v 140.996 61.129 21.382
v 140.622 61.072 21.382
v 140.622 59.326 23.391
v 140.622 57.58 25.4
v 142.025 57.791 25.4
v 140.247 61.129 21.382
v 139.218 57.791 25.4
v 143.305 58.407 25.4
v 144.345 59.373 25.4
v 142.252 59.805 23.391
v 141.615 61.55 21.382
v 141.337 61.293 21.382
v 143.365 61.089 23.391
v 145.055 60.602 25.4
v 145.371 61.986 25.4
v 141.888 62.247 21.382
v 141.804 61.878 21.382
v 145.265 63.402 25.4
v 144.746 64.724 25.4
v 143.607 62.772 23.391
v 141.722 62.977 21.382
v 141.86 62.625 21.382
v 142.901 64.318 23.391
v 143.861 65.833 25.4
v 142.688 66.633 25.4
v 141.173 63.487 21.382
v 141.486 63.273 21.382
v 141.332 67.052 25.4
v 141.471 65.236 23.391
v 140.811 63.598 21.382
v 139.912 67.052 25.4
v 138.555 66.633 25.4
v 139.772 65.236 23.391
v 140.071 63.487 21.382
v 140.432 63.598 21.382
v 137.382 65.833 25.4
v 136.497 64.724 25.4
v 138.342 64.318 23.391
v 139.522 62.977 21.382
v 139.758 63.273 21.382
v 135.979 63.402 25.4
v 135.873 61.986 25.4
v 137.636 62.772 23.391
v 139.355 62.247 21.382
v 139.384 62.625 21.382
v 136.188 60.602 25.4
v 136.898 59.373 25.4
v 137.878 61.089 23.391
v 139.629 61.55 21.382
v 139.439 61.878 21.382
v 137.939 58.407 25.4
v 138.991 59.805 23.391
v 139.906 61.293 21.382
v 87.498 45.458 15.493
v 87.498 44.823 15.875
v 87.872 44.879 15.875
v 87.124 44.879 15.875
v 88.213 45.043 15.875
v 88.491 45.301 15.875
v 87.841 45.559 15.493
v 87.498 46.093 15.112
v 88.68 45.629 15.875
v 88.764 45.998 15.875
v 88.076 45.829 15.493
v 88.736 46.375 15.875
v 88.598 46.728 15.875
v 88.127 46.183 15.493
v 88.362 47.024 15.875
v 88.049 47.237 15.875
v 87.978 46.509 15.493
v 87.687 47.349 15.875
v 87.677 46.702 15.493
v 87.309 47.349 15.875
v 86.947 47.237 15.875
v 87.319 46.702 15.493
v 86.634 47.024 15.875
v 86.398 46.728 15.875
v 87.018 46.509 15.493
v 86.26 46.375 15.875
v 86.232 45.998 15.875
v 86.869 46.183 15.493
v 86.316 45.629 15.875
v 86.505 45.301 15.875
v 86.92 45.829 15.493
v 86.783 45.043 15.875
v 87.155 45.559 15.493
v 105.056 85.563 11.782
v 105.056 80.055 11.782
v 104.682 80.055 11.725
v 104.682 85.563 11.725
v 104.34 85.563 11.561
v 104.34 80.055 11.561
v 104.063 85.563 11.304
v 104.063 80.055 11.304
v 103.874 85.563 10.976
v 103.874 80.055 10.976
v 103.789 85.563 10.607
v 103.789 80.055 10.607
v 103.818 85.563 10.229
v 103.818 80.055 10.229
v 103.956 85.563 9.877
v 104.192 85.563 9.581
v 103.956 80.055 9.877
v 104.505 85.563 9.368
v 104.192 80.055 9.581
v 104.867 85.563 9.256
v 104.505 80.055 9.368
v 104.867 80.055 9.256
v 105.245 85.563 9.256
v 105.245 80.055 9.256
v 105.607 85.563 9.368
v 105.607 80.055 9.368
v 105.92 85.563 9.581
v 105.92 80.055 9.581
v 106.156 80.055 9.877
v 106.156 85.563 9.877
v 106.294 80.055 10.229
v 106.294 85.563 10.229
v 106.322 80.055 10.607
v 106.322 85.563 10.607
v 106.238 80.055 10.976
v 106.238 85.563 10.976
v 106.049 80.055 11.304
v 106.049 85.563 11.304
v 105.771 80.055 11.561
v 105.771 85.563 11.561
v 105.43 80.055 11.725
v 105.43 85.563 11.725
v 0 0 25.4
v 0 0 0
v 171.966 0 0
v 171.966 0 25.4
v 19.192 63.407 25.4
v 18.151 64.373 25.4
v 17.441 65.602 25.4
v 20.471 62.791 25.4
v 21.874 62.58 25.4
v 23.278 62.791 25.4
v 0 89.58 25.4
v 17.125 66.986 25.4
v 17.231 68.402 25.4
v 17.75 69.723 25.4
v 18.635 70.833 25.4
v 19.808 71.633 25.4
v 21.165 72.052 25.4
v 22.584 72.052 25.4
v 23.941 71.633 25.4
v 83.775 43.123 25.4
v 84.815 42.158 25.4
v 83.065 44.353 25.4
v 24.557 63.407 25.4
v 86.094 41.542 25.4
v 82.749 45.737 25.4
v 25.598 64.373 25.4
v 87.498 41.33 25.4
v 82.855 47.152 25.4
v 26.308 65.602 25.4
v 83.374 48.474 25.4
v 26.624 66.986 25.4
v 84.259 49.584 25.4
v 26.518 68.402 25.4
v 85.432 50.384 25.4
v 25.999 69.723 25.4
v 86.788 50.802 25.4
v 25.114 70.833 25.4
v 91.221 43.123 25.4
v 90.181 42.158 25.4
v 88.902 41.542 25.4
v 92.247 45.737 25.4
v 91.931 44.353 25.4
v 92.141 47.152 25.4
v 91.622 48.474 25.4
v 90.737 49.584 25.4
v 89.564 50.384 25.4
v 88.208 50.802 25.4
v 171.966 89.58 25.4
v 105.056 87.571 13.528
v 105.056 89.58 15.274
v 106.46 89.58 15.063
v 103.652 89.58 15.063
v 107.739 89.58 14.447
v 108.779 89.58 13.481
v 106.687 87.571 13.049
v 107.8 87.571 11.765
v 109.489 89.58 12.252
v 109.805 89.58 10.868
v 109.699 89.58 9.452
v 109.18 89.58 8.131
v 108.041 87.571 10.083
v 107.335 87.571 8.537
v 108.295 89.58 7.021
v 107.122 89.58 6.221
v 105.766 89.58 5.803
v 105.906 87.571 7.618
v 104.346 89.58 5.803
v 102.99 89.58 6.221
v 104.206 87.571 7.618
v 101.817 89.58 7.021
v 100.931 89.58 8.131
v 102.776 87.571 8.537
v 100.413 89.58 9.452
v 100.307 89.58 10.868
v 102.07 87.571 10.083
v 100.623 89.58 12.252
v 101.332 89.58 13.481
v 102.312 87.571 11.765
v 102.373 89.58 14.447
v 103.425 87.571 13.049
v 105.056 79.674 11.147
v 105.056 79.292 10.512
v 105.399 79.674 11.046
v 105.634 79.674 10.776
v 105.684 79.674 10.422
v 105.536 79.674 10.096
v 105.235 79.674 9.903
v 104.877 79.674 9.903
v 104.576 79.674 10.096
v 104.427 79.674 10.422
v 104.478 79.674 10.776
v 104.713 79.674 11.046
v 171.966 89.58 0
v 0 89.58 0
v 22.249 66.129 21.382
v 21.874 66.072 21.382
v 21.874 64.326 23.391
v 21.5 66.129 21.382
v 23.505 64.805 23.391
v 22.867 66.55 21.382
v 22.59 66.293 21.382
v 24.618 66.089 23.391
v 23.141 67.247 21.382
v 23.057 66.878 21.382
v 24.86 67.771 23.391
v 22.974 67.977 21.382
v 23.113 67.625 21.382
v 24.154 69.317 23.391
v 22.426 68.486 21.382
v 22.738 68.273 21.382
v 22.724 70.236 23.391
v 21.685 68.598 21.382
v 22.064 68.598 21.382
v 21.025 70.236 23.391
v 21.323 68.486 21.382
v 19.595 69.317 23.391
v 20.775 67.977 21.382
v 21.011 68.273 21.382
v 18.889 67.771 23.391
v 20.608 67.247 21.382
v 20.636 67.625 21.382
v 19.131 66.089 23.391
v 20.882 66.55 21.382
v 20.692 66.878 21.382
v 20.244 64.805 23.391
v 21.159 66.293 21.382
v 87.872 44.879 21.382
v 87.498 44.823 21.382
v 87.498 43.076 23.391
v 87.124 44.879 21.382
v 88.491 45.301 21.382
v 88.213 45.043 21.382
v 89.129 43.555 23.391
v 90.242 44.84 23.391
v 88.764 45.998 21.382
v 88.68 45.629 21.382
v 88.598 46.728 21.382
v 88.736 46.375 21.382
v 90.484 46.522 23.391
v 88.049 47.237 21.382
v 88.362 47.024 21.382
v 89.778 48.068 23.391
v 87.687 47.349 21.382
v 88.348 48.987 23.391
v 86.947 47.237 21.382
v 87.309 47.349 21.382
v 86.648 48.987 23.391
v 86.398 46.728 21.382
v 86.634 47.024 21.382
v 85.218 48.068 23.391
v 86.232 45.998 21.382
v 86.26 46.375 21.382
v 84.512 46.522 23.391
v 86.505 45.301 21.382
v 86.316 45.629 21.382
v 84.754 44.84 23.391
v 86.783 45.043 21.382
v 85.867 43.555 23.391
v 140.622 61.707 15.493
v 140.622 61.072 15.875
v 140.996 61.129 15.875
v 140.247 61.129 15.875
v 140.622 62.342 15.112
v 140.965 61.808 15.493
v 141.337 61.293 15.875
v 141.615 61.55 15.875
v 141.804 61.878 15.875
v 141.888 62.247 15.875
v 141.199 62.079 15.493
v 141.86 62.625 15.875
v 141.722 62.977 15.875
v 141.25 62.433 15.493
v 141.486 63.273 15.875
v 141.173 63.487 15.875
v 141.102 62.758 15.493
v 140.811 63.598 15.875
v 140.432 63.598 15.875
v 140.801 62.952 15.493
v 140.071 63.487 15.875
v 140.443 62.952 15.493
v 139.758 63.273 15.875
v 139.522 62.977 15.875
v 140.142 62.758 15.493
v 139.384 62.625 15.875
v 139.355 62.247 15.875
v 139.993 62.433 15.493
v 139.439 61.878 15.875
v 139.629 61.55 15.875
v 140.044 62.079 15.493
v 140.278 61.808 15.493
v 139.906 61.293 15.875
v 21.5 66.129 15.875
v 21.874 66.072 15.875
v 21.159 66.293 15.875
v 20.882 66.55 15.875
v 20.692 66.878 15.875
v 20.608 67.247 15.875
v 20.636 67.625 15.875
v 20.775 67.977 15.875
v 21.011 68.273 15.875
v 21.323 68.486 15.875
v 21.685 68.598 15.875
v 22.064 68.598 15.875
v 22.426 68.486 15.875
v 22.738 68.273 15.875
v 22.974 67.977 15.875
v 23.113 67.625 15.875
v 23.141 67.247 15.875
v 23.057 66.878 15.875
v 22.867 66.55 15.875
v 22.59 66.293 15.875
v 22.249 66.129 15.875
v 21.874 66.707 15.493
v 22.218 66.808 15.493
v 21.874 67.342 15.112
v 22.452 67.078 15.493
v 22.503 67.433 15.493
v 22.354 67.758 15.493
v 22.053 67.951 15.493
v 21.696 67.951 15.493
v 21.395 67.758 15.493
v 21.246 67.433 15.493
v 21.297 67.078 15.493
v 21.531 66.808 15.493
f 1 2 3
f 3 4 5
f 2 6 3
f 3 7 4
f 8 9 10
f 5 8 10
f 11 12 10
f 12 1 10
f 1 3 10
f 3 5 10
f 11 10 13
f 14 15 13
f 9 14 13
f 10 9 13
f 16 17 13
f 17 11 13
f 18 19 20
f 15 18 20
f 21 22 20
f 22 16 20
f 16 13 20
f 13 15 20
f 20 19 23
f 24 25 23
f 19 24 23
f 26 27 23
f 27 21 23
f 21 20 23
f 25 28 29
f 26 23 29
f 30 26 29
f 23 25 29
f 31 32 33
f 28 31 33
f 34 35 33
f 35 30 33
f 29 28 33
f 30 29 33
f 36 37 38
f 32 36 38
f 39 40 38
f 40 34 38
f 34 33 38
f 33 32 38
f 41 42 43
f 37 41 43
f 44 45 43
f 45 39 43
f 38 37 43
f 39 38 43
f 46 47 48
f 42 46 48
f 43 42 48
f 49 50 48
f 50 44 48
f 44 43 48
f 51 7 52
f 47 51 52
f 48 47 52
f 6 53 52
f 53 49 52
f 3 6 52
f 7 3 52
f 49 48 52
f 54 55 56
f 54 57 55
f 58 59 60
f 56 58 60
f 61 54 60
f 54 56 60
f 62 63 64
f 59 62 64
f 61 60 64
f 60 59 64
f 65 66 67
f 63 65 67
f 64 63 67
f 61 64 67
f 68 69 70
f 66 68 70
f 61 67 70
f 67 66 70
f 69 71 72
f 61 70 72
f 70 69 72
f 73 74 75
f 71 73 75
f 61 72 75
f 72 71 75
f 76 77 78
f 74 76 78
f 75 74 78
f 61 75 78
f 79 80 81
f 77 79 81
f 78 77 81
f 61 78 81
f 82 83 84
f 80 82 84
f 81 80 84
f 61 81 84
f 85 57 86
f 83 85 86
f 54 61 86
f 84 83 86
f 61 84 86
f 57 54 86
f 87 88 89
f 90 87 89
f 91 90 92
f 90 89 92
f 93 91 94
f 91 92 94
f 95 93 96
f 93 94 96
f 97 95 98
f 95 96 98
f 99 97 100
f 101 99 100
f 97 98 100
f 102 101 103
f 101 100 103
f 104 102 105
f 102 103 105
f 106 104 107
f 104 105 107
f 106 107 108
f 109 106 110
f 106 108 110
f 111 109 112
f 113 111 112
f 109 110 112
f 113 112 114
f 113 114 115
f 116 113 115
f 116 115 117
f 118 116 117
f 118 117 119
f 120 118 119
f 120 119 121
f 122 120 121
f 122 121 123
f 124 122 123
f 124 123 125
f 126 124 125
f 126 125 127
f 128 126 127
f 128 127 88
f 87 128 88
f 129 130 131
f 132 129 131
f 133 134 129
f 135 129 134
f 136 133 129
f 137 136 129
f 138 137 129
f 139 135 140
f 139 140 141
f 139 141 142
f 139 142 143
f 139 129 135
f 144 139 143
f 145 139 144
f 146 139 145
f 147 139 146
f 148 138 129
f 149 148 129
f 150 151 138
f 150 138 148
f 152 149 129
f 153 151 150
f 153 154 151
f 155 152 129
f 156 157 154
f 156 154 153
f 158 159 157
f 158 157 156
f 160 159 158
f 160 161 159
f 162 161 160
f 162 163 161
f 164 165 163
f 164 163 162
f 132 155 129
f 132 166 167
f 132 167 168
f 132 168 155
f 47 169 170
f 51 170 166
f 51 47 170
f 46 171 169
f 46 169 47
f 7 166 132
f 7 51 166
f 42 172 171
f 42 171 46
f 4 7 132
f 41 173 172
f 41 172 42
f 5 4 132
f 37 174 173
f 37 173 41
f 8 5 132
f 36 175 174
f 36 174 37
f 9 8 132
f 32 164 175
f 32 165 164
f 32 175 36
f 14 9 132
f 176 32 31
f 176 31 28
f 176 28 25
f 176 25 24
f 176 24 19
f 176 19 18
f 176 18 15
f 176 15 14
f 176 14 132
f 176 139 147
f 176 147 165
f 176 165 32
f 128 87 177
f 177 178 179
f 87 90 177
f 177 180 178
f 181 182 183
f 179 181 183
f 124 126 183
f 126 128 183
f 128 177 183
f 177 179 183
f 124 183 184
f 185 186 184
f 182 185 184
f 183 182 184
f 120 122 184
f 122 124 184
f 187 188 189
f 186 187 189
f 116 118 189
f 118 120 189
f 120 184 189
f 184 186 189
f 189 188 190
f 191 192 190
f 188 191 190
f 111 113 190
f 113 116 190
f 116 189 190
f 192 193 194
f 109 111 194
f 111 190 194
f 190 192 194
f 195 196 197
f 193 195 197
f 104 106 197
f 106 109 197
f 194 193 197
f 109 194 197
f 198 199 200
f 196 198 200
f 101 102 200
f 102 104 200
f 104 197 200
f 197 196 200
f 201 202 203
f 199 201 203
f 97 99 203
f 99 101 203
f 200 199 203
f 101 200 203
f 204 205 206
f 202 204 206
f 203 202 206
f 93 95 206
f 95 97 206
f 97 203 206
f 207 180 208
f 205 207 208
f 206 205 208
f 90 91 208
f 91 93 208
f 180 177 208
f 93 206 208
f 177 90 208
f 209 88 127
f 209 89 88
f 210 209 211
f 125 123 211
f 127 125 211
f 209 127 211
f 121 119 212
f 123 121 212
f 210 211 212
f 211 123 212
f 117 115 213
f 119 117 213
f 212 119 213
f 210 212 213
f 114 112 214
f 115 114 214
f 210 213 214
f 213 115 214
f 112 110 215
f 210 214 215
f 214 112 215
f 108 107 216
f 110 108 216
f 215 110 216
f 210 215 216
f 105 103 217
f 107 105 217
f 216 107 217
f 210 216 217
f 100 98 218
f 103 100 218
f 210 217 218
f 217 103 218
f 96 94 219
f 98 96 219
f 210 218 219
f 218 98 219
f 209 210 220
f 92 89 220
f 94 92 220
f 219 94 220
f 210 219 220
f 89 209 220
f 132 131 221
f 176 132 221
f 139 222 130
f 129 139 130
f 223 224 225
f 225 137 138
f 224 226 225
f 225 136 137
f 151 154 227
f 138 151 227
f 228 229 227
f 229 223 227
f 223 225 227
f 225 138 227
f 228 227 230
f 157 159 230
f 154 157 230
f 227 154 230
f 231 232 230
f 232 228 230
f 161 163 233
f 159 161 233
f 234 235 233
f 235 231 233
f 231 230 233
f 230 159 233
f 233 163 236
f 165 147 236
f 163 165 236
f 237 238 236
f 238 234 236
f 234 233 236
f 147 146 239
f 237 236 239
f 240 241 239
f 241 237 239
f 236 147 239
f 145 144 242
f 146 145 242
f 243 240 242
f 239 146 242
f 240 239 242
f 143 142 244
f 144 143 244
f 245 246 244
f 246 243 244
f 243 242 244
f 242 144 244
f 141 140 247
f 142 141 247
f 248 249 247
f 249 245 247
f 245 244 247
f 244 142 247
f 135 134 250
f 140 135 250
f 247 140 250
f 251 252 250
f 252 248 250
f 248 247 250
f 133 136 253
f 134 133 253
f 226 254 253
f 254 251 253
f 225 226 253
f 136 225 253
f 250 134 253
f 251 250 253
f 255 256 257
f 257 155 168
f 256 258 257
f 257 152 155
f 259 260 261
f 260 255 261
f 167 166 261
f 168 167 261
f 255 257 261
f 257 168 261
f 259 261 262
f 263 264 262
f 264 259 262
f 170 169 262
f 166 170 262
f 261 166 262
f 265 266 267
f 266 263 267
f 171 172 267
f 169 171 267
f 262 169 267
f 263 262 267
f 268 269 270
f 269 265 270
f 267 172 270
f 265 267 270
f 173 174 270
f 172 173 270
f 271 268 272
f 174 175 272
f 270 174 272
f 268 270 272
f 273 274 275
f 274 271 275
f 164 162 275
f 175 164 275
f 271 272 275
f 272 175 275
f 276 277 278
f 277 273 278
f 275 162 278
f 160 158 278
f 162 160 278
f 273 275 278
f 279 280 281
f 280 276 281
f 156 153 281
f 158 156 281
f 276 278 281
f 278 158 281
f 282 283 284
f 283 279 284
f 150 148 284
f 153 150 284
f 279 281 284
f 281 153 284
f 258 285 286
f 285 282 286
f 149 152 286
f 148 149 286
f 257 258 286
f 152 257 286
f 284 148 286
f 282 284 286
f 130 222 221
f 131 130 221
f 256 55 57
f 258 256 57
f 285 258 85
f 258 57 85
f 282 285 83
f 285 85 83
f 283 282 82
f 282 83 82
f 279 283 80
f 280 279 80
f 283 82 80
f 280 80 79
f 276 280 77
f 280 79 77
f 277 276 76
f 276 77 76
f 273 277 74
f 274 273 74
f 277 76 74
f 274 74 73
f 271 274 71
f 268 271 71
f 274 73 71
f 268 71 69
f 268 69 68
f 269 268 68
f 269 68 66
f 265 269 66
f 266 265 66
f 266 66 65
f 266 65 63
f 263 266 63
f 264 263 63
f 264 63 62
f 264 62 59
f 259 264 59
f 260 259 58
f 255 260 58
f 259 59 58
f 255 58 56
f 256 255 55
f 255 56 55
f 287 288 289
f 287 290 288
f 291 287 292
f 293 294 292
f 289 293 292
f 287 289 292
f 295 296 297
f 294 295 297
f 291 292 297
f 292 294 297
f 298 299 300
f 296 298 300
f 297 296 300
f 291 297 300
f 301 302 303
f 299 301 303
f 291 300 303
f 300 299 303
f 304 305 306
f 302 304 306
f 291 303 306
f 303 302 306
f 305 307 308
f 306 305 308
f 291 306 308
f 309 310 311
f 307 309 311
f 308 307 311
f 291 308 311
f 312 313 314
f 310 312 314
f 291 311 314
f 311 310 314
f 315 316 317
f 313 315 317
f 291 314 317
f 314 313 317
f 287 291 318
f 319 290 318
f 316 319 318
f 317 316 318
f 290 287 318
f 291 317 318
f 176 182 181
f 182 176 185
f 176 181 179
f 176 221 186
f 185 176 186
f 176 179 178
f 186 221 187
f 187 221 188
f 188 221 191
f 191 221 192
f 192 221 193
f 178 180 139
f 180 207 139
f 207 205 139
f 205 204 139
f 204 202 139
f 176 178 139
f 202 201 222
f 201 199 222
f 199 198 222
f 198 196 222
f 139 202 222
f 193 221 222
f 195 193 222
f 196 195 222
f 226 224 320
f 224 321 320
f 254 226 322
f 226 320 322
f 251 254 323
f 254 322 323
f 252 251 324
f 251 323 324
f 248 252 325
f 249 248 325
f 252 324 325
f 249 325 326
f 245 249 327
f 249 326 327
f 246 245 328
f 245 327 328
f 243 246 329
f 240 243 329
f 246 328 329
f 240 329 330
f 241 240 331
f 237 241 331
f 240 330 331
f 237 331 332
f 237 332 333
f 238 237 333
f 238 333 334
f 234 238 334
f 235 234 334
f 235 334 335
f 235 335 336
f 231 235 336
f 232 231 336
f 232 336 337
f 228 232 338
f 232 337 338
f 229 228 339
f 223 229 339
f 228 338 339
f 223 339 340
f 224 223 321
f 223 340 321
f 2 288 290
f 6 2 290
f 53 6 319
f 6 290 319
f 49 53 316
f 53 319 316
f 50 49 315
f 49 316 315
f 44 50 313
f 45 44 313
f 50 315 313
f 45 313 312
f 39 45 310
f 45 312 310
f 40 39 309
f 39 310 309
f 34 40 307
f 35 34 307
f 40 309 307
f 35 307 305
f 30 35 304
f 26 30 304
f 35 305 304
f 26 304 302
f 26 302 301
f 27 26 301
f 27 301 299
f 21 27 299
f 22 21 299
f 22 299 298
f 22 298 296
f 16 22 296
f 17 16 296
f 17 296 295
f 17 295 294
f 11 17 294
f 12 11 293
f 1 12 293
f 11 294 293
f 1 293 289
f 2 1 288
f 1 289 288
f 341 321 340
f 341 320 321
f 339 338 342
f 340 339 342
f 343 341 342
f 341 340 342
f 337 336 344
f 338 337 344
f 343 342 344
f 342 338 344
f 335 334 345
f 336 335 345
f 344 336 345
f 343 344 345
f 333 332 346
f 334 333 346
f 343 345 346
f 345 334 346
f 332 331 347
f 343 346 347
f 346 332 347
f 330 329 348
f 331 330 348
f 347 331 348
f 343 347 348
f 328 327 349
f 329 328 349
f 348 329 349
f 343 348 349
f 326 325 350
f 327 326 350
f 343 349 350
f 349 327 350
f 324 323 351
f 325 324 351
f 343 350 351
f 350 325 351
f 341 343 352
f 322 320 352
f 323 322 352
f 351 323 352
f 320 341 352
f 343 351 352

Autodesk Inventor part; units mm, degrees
ref_plane "YZ Plane" through (0, 0, 0) normal (1, 0, 0) x (0, 1, 0)
ref_plane "XZ Plane" through (0, 0, 0) normal (0, 1, 0) x (-1, 0, 0)
ref_plane "XY Plane" through (0, 0, 0) normal (0, 0, 1) x (1, 0, 0)
sketch "Sketch1" plane through (0, 0, 0) normal (0, 0, 1) x (1, 0, 0)
  line L0 (0, 0) -> (171.9662, 0)
  line L1 (171.9662, 0) -> (171.9662, 89.5803)
  line L2 (171.9662, 89.5803) -> (0, 89.5803)
  line L3 (0, 89.5803) -> (0, 0)
extrude "Extrusion1" add sketch "Sketch1" along normal blind 25.4
hole "Hole1" at (105.0559, 89.5803, 10.5119) direction (0, -1, 0) diameter 2.54 depth 9.525 tip angle 118 countersink diameter 9.525 countersink angle 82
sketch "Sketch2" plane through (0, 0, 25.4) normal (0, 0, 1) x (1, 0, 0)
  point P0 (0, 0)
sketch "Sketch3" plane through (0, 0, 25.4) normal (0, 0, 1) x (1, 0, 0)
  point P0 (0, 0)
  point P1 (21.8745, 67.3422)
  point P2 (140.6217, 62.3423)
  point P3 (87.498, 46.0927)
hole "Hole2" at (87.498, 46.0927, 25.4) at (140.6217, 62.3423, 25.4) at (21.8745, 67.3422, 25.4) direction (0, 0, -1) diameter 2.54 depth 9.525 tip angle 118 countersink diameter 9.525 countersink angle 82
